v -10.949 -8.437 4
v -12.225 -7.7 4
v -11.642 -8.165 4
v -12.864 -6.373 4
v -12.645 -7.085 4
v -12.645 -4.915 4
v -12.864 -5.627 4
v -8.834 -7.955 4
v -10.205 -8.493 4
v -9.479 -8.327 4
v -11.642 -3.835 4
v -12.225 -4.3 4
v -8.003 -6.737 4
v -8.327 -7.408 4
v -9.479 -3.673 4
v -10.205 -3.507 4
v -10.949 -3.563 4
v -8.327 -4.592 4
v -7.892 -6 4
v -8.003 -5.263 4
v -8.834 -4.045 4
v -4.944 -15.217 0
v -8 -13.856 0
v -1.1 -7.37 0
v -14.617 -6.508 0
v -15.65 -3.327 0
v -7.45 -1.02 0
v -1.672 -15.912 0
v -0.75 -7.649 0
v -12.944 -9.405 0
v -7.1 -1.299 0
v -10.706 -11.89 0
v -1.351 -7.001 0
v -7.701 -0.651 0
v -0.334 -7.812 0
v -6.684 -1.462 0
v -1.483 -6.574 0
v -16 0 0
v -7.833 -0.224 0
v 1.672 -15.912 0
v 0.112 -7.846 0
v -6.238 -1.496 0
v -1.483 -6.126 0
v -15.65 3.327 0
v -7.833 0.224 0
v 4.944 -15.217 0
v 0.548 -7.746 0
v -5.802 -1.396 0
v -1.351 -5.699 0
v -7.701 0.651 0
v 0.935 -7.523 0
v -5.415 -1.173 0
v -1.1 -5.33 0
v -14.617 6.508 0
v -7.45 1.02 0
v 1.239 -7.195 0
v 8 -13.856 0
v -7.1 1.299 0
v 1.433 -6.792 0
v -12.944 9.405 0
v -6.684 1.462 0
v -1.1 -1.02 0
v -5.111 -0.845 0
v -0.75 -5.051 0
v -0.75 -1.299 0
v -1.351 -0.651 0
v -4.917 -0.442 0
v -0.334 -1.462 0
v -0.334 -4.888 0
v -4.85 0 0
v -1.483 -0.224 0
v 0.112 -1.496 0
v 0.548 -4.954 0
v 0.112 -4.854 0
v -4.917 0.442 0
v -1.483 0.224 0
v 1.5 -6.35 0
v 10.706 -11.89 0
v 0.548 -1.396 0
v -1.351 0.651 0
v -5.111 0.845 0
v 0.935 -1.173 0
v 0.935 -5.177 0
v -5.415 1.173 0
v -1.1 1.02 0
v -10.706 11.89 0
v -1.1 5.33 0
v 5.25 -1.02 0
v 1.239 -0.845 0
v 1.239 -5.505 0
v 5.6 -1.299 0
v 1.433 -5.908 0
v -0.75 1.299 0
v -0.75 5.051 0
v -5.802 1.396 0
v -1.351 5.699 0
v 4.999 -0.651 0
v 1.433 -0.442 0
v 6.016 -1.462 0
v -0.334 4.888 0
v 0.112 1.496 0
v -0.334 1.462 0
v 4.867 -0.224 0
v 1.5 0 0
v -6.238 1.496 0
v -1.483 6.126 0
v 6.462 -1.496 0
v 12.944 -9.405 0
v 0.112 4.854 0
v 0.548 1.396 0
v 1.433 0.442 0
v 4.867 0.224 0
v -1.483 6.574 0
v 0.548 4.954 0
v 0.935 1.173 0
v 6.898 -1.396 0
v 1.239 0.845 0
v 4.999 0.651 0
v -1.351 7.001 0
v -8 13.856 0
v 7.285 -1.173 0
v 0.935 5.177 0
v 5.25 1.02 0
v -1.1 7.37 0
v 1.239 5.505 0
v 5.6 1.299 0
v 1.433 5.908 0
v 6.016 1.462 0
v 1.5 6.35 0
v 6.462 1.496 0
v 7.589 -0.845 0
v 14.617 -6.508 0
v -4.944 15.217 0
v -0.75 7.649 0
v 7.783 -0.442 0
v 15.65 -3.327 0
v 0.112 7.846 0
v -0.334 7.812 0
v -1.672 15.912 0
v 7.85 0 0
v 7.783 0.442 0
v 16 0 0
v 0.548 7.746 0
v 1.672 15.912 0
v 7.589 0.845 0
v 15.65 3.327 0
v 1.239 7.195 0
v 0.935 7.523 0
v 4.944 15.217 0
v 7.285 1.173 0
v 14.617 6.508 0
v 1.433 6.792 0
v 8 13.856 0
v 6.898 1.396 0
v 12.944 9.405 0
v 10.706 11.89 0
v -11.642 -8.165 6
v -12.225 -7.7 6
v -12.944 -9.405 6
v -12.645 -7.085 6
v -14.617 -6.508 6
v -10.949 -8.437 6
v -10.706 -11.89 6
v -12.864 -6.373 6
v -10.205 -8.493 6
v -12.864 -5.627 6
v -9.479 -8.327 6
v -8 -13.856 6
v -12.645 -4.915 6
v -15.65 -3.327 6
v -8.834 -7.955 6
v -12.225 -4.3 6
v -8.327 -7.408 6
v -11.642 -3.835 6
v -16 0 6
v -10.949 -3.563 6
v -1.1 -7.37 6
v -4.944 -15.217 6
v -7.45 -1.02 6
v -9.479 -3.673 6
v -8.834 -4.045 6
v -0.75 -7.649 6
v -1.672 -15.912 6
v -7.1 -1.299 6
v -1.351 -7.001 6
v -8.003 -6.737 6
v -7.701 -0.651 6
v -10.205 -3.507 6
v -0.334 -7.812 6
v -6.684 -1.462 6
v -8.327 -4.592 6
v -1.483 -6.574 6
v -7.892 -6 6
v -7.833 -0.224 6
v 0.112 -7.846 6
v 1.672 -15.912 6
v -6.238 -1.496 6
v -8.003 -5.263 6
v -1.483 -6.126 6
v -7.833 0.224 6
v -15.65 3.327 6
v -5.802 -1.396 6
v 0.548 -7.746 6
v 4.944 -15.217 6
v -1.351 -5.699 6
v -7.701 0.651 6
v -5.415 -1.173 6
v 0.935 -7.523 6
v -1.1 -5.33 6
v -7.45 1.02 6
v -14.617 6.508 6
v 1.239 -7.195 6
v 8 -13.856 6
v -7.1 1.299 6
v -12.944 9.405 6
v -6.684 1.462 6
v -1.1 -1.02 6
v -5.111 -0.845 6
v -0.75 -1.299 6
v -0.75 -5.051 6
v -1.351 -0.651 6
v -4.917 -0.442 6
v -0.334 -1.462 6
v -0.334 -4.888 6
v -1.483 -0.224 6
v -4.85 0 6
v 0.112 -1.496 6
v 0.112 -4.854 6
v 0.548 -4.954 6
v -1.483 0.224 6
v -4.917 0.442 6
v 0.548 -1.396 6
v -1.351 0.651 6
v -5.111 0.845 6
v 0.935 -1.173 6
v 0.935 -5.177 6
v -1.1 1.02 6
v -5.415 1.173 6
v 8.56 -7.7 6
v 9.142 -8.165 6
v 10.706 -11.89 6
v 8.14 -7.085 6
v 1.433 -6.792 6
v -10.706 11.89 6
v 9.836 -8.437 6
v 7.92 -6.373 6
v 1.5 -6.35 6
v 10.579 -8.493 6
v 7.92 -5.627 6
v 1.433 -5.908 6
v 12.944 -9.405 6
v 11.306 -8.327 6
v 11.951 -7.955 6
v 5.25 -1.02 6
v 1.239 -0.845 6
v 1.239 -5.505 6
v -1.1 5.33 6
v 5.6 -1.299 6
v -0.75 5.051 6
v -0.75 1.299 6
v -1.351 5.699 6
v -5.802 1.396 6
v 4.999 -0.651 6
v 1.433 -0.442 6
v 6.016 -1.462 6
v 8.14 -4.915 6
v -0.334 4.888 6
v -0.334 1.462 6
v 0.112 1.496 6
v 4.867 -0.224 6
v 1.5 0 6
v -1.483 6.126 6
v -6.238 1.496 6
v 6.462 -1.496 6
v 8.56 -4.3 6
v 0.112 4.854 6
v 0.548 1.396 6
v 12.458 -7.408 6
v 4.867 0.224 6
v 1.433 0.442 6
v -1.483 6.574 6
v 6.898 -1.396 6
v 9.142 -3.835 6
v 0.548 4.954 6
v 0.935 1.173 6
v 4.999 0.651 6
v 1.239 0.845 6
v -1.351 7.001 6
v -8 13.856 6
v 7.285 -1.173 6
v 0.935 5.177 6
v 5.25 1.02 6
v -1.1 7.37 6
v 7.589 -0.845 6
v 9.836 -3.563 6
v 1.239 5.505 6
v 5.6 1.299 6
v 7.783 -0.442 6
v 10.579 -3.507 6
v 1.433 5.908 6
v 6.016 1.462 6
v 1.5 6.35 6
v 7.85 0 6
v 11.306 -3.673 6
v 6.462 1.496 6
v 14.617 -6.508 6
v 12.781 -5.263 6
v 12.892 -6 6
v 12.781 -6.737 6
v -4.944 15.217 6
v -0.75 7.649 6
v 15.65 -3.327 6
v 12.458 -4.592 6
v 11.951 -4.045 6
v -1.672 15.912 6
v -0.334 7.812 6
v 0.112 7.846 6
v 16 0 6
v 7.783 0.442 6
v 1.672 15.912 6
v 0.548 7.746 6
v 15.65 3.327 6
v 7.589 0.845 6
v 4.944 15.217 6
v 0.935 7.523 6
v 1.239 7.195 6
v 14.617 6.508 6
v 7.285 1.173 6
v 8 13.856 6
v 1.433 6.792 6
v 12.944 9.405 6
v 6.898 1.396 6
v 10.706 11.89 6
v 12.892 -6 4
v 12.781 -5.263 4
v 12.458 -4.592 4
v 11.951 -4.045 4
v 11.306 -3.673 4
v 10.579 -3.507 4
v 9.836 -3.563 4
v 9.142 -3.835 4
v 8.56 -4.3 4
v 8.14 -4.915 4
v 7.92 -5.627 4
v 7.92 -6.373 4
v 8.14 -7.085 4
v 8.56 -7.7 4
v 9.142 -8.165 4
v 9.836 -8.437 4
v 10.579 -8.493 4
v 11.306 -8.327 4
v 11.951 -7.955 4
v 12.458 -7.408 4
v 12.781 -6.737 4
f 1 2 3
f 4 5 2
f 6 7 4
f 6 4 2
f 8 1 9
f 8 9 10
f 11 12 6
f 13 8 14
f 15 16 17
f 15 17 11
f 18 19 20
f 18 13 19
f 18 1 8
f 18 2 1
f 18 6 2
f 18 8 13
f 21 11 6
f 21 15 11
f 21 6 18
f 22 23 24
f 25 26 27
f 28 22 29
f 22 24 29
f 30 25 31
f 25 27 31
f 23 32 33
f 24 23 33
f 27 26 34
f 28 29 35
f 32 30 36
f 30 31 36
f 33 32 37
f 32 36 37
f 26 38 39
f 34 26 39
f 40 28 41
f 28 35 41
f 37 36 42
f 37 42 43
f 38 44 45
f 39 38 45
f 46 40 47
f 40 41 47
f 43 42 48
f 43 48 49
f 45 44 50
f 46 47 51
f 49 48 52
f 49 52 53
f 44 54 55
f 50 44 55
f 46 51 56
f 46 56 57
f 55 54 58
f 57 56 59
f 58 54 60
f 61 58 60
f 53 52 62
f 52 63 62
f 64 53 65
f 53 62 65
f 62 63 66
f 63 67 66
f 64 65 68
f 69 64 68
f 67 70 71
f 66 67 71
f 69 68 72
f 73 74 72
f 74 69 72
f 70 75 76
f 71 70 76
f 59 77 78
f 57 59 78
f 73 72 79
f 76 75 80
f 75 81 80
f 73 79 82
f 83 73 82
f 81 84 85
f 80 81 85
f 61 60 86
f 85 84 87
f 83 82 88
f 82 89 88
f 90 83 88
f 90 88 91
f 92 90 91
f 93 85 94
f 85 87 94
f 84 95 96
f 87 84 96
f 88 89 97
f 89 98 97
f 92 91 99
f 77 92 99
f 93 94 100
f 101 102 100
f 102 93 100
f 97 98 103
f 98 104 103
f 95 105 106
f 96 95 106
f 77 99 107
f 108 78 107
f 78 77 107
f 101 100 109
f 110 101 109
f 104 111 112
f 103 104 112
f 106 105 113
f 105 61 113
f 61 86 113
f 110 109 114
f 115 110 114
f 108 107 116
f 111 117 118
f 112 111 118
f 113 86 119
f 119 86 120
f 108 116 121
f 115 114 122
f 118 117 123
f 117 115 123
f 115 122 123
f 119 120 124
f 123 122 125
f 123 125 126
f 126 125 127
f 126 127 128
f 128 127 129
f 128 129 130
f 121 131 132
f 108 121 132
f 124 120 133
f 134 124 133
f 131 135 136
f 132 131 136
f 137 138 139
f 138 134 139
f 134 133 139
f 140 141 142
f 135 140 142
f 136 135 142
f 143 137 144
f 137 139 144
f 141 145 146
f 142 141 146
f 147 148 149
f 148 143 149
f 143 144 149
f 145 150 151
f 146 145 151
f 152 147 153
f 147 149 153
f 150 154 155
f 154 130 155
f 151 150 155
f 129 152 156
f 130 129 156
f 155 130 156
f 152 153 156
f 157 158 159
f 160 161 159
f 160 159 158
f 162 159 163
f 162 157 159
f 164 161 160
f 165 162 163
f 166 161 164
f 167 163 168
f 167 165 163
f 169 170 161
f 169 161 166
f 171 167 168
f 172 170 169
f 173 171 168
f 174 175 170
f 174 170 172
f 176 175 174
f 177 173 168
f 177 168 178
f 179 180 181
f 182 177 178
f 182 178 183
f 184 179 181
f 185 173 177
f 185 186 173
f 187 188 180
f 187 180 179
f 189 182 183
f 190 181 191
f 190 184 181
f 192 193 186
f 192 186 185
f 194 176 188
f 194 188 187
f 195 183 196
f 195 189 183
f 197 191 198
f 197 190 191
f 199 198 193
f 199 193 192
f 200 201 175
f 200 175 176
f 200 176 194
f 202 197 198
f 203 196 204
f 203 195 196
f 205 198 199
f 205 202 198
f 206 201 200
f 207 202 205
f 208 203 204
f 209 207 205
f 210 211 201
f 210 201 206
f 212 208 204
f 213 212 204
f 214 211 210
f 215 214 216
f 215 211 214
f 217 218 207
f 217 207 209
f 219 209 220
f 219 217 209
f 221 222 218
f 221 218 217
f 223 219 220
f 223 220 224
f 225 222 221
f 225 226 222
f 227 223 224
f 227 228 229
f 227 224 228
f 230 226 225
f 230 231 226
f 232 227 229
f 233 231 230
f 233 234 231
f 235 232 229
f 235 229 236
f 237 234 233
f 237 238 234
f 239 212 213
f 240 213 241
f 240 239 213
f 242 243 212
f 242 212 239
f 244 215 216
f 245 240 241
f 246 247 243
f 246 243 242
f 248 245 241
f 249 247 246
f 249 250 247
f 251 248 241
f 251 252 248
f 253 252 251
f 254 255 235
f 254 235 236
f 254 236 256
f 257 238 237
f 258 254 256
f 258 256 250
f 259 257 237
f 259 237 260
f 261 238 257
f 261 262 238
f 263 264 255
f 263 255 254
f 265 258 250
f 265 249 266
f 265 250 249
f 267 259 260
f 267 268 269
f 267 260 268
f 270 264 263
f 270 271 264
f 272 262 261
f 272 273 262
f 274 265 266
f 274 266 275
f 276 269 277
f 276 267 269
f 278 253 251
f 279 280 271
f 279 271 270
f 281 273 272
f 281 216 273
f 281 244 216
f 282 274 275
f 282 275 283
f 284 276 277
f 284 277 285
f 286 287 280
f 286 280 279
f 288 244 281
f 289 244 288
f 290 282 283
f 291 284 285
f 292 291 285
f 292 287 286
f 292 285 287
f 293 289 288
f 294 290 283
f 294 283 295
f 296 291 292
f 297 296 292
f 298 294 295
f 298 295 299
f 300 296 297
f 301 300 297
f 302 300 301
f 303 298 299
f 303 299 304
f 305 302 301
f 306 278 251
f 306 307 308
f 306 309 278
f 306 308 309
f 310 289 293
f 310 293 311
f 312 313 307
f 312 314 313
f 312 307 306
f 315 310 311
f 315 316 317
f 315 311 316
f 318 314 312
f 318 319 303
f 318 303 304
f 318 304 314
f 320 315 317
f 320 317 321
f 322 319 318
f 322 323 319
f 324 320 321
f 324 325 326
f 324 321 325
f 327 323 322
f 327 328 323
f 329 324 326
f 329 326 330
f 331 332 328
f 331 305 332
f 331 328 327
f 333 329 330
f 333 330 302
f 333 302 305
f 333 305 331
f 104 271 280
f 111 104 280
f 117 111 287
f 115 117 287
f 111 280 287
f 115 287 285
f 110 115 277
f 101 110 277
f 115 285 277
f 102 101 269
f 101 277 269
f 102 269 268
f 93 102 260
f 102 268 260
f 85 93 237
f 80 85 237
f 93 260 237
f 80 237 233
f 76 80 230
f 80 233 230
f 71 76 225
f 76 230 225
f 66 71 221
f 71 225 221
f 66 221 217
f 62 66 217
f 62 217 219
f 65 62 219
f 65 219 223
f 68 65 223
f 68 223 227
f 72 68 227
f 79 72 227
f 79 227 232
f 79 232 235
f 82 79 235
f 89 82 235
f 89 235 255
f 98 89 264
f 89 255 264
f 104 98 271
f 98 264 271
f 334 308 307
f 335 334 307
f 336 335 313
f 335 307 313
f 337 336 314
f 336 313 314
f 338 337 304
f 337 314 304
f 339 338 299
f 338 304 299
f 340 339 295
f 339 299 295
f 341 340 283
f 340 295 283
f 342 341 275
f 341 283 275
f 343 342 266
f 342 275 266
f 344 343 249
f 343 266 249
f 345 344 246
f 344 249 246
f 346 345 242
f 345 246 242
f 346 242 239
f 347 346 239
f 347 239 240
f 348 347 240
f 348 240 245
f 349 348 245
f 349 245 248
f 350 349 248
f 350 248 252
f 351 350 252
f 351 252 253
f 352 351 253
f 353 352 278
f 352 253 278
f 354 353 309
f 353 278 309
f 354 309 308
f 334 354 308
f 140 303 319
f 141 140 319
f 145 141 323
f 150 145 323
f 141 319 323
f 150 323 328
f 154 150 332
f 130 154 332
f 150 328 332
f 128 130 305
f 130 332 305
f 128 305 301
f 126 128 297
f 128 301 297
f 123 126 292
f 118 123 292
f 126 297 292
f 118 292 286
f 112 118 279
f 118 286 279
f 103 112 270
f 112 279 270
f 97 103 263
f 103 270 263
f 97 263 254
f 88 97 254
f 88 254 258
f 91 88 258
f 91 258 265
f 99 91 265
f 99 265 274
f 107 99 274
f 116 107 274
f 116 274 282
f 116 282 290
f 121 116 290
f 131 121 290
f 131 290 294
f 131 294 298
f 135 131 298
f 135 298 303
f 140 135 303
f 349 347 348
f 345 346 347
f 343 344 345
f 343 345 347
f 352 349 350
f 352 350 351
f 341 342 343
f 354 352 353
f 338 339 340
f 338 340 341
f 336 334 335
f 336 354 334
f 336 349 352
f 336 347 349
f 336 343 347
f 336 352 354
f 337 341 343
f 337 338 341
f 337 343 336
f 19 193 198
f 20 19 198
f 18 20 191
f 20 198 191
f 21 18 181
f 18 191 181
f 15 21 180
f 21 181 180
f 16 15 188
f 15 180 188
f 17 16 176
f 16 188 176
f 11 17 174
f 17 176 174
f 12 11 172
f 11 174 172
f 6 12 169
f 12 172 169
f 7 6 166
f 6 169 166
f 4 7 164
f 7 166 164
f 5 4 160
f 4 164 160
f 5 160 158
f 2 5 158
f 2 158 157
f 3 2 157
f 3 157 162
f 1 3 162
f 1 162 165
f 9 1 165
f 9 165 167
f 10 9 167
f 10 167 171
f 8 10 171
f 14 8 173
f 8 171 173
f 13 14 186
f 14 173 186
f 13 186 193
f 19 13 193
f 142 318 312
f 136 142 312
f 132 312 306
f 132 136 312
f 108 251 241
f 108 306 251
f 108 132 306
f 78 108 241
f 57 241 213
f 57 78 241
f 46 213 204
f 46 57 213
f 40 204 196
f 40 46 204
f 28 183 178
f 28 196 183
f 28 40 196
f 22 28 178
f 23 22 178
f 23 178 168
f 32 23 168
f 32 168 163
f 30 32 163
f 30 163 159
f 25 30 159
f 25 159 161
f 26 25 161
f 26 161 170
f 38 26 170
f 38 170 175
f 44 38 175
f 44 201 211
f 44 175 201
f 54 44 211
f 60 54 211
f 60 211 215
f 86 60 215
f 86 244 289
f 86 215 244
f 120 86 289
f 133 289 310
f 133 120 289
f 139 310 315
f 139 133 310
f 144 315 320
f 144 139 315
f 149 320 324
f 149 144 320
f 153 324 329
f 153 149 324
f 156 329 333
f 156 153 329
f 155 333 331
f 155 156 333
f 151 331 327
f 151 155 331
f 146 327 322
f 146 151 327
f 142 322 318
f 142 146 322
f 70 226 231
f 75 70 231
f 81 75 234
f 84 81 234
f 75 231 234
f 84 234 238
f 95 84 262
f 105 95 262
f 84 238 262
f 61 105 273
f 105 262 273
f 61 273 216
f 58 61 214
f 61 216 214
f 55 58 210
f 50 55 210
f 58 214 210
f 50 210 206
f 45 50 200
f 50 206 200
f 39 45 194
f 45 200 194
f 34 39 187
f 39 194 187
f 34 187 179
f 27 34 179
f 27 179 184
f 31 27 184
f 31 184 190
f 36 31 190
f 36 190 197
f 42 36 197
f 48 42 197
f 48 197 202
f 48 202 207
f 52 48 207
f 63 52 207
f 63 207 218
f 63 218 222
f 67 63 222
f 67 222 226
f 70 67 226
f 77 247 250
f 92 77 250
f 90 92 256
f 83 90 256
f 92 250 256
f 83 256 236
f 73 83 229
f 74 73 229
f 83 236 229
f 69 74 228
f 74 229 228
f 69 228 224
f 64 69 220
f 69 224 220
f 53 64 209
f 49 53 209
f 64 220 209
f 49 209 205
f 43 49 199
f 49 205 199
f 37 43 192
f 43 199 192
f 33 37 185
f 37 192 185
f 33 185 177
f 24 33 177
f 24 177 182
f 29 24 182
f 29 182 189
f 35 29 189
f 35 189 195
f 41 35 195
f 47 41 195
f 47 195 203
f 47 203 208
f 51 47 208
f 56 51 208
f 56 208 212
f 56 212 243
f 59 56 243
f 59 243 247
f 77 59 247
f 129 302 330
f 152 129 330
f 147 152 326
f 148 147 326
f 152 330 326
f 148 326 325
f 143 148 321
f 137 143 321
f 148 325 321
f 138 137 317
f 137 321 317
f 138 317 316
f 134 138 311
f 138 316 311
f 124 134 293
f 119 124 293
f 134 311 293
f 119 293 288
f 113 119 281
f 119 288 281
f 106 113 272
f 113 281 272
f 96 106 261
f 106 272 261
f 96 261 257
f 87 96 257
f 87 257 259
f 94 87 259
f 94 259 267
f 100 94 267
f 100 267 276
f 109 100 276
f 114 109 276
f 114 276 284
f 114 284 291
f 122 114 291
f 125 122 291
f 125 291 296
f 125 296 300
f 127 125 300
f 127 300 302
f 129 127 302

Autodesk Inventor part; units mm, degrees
ref_plane "YZ Plane" through (0, 0, 0) normal (1, 0, 0) x (0, 1, 0)
ref_plane "XZ Plane" through (0, 0, 0) normal (0, 1, 0) x (-1, 0, 0)
ref_plane "XY Plane" through (0, 0, 0) normal (0, 0, 1) x (1, 0, 0)
sketch "Sketch1" plane through (0, 0, 0) normal (0, 0, 1) x (1, 0, 0)
  circle A0 centre (0, 0) radius 16
  dimension "d0" = 32
extrude "Extrusion1" add sketch "Sketch1" along normal blind 6
sketch "Sketch2" plane through (0, 0, 6) normal (0, 0, 1) x (1, 0, 0)
  circle A0 centre (-10.3923, -6) radius 2.5
  circle A1 centre (10.3923, -6) radius 2.5
  circle A2 centre (0, 0) radius 12 construction
  line L0 (-10.3923, -6) -> (0, 0) construction
  line L1 (0, 0) -> (10.3923, -6) construction
  line L2 (0, 0) -> (0, 12) construction
  dimension "d3" = 120
  dimension "d4" = 5
  dimension "d5" = 24
sketch "Sketch3" plane through (0, 0, 6) normal (0, 0, 1) x (1, 0, 0)
  circle A0 centre (0, 0) radius 1.5
  circle A1 centre (0, 6.35) radius 1.5
  circle A2 centre (0, 0) radius 6.35 construction
  circle A3 centre (-6.35, 0) radius 1.5
  circle A4 centre (0, -6.35) radius 1.5
  circle A5 centre (6.35, 0) radius 1.5
  dimension "d8" = 3
  dimension "d13" = 3
  dimension "d14" = 6.35
  dimension "d17" = 360
extrude "Extrusion3" cut sketch "Sketch3" against normal up to next
extrude "Extrusion4" cut sketch "Sketch2" against normal blind 2
properties part number "slider_wheel"
